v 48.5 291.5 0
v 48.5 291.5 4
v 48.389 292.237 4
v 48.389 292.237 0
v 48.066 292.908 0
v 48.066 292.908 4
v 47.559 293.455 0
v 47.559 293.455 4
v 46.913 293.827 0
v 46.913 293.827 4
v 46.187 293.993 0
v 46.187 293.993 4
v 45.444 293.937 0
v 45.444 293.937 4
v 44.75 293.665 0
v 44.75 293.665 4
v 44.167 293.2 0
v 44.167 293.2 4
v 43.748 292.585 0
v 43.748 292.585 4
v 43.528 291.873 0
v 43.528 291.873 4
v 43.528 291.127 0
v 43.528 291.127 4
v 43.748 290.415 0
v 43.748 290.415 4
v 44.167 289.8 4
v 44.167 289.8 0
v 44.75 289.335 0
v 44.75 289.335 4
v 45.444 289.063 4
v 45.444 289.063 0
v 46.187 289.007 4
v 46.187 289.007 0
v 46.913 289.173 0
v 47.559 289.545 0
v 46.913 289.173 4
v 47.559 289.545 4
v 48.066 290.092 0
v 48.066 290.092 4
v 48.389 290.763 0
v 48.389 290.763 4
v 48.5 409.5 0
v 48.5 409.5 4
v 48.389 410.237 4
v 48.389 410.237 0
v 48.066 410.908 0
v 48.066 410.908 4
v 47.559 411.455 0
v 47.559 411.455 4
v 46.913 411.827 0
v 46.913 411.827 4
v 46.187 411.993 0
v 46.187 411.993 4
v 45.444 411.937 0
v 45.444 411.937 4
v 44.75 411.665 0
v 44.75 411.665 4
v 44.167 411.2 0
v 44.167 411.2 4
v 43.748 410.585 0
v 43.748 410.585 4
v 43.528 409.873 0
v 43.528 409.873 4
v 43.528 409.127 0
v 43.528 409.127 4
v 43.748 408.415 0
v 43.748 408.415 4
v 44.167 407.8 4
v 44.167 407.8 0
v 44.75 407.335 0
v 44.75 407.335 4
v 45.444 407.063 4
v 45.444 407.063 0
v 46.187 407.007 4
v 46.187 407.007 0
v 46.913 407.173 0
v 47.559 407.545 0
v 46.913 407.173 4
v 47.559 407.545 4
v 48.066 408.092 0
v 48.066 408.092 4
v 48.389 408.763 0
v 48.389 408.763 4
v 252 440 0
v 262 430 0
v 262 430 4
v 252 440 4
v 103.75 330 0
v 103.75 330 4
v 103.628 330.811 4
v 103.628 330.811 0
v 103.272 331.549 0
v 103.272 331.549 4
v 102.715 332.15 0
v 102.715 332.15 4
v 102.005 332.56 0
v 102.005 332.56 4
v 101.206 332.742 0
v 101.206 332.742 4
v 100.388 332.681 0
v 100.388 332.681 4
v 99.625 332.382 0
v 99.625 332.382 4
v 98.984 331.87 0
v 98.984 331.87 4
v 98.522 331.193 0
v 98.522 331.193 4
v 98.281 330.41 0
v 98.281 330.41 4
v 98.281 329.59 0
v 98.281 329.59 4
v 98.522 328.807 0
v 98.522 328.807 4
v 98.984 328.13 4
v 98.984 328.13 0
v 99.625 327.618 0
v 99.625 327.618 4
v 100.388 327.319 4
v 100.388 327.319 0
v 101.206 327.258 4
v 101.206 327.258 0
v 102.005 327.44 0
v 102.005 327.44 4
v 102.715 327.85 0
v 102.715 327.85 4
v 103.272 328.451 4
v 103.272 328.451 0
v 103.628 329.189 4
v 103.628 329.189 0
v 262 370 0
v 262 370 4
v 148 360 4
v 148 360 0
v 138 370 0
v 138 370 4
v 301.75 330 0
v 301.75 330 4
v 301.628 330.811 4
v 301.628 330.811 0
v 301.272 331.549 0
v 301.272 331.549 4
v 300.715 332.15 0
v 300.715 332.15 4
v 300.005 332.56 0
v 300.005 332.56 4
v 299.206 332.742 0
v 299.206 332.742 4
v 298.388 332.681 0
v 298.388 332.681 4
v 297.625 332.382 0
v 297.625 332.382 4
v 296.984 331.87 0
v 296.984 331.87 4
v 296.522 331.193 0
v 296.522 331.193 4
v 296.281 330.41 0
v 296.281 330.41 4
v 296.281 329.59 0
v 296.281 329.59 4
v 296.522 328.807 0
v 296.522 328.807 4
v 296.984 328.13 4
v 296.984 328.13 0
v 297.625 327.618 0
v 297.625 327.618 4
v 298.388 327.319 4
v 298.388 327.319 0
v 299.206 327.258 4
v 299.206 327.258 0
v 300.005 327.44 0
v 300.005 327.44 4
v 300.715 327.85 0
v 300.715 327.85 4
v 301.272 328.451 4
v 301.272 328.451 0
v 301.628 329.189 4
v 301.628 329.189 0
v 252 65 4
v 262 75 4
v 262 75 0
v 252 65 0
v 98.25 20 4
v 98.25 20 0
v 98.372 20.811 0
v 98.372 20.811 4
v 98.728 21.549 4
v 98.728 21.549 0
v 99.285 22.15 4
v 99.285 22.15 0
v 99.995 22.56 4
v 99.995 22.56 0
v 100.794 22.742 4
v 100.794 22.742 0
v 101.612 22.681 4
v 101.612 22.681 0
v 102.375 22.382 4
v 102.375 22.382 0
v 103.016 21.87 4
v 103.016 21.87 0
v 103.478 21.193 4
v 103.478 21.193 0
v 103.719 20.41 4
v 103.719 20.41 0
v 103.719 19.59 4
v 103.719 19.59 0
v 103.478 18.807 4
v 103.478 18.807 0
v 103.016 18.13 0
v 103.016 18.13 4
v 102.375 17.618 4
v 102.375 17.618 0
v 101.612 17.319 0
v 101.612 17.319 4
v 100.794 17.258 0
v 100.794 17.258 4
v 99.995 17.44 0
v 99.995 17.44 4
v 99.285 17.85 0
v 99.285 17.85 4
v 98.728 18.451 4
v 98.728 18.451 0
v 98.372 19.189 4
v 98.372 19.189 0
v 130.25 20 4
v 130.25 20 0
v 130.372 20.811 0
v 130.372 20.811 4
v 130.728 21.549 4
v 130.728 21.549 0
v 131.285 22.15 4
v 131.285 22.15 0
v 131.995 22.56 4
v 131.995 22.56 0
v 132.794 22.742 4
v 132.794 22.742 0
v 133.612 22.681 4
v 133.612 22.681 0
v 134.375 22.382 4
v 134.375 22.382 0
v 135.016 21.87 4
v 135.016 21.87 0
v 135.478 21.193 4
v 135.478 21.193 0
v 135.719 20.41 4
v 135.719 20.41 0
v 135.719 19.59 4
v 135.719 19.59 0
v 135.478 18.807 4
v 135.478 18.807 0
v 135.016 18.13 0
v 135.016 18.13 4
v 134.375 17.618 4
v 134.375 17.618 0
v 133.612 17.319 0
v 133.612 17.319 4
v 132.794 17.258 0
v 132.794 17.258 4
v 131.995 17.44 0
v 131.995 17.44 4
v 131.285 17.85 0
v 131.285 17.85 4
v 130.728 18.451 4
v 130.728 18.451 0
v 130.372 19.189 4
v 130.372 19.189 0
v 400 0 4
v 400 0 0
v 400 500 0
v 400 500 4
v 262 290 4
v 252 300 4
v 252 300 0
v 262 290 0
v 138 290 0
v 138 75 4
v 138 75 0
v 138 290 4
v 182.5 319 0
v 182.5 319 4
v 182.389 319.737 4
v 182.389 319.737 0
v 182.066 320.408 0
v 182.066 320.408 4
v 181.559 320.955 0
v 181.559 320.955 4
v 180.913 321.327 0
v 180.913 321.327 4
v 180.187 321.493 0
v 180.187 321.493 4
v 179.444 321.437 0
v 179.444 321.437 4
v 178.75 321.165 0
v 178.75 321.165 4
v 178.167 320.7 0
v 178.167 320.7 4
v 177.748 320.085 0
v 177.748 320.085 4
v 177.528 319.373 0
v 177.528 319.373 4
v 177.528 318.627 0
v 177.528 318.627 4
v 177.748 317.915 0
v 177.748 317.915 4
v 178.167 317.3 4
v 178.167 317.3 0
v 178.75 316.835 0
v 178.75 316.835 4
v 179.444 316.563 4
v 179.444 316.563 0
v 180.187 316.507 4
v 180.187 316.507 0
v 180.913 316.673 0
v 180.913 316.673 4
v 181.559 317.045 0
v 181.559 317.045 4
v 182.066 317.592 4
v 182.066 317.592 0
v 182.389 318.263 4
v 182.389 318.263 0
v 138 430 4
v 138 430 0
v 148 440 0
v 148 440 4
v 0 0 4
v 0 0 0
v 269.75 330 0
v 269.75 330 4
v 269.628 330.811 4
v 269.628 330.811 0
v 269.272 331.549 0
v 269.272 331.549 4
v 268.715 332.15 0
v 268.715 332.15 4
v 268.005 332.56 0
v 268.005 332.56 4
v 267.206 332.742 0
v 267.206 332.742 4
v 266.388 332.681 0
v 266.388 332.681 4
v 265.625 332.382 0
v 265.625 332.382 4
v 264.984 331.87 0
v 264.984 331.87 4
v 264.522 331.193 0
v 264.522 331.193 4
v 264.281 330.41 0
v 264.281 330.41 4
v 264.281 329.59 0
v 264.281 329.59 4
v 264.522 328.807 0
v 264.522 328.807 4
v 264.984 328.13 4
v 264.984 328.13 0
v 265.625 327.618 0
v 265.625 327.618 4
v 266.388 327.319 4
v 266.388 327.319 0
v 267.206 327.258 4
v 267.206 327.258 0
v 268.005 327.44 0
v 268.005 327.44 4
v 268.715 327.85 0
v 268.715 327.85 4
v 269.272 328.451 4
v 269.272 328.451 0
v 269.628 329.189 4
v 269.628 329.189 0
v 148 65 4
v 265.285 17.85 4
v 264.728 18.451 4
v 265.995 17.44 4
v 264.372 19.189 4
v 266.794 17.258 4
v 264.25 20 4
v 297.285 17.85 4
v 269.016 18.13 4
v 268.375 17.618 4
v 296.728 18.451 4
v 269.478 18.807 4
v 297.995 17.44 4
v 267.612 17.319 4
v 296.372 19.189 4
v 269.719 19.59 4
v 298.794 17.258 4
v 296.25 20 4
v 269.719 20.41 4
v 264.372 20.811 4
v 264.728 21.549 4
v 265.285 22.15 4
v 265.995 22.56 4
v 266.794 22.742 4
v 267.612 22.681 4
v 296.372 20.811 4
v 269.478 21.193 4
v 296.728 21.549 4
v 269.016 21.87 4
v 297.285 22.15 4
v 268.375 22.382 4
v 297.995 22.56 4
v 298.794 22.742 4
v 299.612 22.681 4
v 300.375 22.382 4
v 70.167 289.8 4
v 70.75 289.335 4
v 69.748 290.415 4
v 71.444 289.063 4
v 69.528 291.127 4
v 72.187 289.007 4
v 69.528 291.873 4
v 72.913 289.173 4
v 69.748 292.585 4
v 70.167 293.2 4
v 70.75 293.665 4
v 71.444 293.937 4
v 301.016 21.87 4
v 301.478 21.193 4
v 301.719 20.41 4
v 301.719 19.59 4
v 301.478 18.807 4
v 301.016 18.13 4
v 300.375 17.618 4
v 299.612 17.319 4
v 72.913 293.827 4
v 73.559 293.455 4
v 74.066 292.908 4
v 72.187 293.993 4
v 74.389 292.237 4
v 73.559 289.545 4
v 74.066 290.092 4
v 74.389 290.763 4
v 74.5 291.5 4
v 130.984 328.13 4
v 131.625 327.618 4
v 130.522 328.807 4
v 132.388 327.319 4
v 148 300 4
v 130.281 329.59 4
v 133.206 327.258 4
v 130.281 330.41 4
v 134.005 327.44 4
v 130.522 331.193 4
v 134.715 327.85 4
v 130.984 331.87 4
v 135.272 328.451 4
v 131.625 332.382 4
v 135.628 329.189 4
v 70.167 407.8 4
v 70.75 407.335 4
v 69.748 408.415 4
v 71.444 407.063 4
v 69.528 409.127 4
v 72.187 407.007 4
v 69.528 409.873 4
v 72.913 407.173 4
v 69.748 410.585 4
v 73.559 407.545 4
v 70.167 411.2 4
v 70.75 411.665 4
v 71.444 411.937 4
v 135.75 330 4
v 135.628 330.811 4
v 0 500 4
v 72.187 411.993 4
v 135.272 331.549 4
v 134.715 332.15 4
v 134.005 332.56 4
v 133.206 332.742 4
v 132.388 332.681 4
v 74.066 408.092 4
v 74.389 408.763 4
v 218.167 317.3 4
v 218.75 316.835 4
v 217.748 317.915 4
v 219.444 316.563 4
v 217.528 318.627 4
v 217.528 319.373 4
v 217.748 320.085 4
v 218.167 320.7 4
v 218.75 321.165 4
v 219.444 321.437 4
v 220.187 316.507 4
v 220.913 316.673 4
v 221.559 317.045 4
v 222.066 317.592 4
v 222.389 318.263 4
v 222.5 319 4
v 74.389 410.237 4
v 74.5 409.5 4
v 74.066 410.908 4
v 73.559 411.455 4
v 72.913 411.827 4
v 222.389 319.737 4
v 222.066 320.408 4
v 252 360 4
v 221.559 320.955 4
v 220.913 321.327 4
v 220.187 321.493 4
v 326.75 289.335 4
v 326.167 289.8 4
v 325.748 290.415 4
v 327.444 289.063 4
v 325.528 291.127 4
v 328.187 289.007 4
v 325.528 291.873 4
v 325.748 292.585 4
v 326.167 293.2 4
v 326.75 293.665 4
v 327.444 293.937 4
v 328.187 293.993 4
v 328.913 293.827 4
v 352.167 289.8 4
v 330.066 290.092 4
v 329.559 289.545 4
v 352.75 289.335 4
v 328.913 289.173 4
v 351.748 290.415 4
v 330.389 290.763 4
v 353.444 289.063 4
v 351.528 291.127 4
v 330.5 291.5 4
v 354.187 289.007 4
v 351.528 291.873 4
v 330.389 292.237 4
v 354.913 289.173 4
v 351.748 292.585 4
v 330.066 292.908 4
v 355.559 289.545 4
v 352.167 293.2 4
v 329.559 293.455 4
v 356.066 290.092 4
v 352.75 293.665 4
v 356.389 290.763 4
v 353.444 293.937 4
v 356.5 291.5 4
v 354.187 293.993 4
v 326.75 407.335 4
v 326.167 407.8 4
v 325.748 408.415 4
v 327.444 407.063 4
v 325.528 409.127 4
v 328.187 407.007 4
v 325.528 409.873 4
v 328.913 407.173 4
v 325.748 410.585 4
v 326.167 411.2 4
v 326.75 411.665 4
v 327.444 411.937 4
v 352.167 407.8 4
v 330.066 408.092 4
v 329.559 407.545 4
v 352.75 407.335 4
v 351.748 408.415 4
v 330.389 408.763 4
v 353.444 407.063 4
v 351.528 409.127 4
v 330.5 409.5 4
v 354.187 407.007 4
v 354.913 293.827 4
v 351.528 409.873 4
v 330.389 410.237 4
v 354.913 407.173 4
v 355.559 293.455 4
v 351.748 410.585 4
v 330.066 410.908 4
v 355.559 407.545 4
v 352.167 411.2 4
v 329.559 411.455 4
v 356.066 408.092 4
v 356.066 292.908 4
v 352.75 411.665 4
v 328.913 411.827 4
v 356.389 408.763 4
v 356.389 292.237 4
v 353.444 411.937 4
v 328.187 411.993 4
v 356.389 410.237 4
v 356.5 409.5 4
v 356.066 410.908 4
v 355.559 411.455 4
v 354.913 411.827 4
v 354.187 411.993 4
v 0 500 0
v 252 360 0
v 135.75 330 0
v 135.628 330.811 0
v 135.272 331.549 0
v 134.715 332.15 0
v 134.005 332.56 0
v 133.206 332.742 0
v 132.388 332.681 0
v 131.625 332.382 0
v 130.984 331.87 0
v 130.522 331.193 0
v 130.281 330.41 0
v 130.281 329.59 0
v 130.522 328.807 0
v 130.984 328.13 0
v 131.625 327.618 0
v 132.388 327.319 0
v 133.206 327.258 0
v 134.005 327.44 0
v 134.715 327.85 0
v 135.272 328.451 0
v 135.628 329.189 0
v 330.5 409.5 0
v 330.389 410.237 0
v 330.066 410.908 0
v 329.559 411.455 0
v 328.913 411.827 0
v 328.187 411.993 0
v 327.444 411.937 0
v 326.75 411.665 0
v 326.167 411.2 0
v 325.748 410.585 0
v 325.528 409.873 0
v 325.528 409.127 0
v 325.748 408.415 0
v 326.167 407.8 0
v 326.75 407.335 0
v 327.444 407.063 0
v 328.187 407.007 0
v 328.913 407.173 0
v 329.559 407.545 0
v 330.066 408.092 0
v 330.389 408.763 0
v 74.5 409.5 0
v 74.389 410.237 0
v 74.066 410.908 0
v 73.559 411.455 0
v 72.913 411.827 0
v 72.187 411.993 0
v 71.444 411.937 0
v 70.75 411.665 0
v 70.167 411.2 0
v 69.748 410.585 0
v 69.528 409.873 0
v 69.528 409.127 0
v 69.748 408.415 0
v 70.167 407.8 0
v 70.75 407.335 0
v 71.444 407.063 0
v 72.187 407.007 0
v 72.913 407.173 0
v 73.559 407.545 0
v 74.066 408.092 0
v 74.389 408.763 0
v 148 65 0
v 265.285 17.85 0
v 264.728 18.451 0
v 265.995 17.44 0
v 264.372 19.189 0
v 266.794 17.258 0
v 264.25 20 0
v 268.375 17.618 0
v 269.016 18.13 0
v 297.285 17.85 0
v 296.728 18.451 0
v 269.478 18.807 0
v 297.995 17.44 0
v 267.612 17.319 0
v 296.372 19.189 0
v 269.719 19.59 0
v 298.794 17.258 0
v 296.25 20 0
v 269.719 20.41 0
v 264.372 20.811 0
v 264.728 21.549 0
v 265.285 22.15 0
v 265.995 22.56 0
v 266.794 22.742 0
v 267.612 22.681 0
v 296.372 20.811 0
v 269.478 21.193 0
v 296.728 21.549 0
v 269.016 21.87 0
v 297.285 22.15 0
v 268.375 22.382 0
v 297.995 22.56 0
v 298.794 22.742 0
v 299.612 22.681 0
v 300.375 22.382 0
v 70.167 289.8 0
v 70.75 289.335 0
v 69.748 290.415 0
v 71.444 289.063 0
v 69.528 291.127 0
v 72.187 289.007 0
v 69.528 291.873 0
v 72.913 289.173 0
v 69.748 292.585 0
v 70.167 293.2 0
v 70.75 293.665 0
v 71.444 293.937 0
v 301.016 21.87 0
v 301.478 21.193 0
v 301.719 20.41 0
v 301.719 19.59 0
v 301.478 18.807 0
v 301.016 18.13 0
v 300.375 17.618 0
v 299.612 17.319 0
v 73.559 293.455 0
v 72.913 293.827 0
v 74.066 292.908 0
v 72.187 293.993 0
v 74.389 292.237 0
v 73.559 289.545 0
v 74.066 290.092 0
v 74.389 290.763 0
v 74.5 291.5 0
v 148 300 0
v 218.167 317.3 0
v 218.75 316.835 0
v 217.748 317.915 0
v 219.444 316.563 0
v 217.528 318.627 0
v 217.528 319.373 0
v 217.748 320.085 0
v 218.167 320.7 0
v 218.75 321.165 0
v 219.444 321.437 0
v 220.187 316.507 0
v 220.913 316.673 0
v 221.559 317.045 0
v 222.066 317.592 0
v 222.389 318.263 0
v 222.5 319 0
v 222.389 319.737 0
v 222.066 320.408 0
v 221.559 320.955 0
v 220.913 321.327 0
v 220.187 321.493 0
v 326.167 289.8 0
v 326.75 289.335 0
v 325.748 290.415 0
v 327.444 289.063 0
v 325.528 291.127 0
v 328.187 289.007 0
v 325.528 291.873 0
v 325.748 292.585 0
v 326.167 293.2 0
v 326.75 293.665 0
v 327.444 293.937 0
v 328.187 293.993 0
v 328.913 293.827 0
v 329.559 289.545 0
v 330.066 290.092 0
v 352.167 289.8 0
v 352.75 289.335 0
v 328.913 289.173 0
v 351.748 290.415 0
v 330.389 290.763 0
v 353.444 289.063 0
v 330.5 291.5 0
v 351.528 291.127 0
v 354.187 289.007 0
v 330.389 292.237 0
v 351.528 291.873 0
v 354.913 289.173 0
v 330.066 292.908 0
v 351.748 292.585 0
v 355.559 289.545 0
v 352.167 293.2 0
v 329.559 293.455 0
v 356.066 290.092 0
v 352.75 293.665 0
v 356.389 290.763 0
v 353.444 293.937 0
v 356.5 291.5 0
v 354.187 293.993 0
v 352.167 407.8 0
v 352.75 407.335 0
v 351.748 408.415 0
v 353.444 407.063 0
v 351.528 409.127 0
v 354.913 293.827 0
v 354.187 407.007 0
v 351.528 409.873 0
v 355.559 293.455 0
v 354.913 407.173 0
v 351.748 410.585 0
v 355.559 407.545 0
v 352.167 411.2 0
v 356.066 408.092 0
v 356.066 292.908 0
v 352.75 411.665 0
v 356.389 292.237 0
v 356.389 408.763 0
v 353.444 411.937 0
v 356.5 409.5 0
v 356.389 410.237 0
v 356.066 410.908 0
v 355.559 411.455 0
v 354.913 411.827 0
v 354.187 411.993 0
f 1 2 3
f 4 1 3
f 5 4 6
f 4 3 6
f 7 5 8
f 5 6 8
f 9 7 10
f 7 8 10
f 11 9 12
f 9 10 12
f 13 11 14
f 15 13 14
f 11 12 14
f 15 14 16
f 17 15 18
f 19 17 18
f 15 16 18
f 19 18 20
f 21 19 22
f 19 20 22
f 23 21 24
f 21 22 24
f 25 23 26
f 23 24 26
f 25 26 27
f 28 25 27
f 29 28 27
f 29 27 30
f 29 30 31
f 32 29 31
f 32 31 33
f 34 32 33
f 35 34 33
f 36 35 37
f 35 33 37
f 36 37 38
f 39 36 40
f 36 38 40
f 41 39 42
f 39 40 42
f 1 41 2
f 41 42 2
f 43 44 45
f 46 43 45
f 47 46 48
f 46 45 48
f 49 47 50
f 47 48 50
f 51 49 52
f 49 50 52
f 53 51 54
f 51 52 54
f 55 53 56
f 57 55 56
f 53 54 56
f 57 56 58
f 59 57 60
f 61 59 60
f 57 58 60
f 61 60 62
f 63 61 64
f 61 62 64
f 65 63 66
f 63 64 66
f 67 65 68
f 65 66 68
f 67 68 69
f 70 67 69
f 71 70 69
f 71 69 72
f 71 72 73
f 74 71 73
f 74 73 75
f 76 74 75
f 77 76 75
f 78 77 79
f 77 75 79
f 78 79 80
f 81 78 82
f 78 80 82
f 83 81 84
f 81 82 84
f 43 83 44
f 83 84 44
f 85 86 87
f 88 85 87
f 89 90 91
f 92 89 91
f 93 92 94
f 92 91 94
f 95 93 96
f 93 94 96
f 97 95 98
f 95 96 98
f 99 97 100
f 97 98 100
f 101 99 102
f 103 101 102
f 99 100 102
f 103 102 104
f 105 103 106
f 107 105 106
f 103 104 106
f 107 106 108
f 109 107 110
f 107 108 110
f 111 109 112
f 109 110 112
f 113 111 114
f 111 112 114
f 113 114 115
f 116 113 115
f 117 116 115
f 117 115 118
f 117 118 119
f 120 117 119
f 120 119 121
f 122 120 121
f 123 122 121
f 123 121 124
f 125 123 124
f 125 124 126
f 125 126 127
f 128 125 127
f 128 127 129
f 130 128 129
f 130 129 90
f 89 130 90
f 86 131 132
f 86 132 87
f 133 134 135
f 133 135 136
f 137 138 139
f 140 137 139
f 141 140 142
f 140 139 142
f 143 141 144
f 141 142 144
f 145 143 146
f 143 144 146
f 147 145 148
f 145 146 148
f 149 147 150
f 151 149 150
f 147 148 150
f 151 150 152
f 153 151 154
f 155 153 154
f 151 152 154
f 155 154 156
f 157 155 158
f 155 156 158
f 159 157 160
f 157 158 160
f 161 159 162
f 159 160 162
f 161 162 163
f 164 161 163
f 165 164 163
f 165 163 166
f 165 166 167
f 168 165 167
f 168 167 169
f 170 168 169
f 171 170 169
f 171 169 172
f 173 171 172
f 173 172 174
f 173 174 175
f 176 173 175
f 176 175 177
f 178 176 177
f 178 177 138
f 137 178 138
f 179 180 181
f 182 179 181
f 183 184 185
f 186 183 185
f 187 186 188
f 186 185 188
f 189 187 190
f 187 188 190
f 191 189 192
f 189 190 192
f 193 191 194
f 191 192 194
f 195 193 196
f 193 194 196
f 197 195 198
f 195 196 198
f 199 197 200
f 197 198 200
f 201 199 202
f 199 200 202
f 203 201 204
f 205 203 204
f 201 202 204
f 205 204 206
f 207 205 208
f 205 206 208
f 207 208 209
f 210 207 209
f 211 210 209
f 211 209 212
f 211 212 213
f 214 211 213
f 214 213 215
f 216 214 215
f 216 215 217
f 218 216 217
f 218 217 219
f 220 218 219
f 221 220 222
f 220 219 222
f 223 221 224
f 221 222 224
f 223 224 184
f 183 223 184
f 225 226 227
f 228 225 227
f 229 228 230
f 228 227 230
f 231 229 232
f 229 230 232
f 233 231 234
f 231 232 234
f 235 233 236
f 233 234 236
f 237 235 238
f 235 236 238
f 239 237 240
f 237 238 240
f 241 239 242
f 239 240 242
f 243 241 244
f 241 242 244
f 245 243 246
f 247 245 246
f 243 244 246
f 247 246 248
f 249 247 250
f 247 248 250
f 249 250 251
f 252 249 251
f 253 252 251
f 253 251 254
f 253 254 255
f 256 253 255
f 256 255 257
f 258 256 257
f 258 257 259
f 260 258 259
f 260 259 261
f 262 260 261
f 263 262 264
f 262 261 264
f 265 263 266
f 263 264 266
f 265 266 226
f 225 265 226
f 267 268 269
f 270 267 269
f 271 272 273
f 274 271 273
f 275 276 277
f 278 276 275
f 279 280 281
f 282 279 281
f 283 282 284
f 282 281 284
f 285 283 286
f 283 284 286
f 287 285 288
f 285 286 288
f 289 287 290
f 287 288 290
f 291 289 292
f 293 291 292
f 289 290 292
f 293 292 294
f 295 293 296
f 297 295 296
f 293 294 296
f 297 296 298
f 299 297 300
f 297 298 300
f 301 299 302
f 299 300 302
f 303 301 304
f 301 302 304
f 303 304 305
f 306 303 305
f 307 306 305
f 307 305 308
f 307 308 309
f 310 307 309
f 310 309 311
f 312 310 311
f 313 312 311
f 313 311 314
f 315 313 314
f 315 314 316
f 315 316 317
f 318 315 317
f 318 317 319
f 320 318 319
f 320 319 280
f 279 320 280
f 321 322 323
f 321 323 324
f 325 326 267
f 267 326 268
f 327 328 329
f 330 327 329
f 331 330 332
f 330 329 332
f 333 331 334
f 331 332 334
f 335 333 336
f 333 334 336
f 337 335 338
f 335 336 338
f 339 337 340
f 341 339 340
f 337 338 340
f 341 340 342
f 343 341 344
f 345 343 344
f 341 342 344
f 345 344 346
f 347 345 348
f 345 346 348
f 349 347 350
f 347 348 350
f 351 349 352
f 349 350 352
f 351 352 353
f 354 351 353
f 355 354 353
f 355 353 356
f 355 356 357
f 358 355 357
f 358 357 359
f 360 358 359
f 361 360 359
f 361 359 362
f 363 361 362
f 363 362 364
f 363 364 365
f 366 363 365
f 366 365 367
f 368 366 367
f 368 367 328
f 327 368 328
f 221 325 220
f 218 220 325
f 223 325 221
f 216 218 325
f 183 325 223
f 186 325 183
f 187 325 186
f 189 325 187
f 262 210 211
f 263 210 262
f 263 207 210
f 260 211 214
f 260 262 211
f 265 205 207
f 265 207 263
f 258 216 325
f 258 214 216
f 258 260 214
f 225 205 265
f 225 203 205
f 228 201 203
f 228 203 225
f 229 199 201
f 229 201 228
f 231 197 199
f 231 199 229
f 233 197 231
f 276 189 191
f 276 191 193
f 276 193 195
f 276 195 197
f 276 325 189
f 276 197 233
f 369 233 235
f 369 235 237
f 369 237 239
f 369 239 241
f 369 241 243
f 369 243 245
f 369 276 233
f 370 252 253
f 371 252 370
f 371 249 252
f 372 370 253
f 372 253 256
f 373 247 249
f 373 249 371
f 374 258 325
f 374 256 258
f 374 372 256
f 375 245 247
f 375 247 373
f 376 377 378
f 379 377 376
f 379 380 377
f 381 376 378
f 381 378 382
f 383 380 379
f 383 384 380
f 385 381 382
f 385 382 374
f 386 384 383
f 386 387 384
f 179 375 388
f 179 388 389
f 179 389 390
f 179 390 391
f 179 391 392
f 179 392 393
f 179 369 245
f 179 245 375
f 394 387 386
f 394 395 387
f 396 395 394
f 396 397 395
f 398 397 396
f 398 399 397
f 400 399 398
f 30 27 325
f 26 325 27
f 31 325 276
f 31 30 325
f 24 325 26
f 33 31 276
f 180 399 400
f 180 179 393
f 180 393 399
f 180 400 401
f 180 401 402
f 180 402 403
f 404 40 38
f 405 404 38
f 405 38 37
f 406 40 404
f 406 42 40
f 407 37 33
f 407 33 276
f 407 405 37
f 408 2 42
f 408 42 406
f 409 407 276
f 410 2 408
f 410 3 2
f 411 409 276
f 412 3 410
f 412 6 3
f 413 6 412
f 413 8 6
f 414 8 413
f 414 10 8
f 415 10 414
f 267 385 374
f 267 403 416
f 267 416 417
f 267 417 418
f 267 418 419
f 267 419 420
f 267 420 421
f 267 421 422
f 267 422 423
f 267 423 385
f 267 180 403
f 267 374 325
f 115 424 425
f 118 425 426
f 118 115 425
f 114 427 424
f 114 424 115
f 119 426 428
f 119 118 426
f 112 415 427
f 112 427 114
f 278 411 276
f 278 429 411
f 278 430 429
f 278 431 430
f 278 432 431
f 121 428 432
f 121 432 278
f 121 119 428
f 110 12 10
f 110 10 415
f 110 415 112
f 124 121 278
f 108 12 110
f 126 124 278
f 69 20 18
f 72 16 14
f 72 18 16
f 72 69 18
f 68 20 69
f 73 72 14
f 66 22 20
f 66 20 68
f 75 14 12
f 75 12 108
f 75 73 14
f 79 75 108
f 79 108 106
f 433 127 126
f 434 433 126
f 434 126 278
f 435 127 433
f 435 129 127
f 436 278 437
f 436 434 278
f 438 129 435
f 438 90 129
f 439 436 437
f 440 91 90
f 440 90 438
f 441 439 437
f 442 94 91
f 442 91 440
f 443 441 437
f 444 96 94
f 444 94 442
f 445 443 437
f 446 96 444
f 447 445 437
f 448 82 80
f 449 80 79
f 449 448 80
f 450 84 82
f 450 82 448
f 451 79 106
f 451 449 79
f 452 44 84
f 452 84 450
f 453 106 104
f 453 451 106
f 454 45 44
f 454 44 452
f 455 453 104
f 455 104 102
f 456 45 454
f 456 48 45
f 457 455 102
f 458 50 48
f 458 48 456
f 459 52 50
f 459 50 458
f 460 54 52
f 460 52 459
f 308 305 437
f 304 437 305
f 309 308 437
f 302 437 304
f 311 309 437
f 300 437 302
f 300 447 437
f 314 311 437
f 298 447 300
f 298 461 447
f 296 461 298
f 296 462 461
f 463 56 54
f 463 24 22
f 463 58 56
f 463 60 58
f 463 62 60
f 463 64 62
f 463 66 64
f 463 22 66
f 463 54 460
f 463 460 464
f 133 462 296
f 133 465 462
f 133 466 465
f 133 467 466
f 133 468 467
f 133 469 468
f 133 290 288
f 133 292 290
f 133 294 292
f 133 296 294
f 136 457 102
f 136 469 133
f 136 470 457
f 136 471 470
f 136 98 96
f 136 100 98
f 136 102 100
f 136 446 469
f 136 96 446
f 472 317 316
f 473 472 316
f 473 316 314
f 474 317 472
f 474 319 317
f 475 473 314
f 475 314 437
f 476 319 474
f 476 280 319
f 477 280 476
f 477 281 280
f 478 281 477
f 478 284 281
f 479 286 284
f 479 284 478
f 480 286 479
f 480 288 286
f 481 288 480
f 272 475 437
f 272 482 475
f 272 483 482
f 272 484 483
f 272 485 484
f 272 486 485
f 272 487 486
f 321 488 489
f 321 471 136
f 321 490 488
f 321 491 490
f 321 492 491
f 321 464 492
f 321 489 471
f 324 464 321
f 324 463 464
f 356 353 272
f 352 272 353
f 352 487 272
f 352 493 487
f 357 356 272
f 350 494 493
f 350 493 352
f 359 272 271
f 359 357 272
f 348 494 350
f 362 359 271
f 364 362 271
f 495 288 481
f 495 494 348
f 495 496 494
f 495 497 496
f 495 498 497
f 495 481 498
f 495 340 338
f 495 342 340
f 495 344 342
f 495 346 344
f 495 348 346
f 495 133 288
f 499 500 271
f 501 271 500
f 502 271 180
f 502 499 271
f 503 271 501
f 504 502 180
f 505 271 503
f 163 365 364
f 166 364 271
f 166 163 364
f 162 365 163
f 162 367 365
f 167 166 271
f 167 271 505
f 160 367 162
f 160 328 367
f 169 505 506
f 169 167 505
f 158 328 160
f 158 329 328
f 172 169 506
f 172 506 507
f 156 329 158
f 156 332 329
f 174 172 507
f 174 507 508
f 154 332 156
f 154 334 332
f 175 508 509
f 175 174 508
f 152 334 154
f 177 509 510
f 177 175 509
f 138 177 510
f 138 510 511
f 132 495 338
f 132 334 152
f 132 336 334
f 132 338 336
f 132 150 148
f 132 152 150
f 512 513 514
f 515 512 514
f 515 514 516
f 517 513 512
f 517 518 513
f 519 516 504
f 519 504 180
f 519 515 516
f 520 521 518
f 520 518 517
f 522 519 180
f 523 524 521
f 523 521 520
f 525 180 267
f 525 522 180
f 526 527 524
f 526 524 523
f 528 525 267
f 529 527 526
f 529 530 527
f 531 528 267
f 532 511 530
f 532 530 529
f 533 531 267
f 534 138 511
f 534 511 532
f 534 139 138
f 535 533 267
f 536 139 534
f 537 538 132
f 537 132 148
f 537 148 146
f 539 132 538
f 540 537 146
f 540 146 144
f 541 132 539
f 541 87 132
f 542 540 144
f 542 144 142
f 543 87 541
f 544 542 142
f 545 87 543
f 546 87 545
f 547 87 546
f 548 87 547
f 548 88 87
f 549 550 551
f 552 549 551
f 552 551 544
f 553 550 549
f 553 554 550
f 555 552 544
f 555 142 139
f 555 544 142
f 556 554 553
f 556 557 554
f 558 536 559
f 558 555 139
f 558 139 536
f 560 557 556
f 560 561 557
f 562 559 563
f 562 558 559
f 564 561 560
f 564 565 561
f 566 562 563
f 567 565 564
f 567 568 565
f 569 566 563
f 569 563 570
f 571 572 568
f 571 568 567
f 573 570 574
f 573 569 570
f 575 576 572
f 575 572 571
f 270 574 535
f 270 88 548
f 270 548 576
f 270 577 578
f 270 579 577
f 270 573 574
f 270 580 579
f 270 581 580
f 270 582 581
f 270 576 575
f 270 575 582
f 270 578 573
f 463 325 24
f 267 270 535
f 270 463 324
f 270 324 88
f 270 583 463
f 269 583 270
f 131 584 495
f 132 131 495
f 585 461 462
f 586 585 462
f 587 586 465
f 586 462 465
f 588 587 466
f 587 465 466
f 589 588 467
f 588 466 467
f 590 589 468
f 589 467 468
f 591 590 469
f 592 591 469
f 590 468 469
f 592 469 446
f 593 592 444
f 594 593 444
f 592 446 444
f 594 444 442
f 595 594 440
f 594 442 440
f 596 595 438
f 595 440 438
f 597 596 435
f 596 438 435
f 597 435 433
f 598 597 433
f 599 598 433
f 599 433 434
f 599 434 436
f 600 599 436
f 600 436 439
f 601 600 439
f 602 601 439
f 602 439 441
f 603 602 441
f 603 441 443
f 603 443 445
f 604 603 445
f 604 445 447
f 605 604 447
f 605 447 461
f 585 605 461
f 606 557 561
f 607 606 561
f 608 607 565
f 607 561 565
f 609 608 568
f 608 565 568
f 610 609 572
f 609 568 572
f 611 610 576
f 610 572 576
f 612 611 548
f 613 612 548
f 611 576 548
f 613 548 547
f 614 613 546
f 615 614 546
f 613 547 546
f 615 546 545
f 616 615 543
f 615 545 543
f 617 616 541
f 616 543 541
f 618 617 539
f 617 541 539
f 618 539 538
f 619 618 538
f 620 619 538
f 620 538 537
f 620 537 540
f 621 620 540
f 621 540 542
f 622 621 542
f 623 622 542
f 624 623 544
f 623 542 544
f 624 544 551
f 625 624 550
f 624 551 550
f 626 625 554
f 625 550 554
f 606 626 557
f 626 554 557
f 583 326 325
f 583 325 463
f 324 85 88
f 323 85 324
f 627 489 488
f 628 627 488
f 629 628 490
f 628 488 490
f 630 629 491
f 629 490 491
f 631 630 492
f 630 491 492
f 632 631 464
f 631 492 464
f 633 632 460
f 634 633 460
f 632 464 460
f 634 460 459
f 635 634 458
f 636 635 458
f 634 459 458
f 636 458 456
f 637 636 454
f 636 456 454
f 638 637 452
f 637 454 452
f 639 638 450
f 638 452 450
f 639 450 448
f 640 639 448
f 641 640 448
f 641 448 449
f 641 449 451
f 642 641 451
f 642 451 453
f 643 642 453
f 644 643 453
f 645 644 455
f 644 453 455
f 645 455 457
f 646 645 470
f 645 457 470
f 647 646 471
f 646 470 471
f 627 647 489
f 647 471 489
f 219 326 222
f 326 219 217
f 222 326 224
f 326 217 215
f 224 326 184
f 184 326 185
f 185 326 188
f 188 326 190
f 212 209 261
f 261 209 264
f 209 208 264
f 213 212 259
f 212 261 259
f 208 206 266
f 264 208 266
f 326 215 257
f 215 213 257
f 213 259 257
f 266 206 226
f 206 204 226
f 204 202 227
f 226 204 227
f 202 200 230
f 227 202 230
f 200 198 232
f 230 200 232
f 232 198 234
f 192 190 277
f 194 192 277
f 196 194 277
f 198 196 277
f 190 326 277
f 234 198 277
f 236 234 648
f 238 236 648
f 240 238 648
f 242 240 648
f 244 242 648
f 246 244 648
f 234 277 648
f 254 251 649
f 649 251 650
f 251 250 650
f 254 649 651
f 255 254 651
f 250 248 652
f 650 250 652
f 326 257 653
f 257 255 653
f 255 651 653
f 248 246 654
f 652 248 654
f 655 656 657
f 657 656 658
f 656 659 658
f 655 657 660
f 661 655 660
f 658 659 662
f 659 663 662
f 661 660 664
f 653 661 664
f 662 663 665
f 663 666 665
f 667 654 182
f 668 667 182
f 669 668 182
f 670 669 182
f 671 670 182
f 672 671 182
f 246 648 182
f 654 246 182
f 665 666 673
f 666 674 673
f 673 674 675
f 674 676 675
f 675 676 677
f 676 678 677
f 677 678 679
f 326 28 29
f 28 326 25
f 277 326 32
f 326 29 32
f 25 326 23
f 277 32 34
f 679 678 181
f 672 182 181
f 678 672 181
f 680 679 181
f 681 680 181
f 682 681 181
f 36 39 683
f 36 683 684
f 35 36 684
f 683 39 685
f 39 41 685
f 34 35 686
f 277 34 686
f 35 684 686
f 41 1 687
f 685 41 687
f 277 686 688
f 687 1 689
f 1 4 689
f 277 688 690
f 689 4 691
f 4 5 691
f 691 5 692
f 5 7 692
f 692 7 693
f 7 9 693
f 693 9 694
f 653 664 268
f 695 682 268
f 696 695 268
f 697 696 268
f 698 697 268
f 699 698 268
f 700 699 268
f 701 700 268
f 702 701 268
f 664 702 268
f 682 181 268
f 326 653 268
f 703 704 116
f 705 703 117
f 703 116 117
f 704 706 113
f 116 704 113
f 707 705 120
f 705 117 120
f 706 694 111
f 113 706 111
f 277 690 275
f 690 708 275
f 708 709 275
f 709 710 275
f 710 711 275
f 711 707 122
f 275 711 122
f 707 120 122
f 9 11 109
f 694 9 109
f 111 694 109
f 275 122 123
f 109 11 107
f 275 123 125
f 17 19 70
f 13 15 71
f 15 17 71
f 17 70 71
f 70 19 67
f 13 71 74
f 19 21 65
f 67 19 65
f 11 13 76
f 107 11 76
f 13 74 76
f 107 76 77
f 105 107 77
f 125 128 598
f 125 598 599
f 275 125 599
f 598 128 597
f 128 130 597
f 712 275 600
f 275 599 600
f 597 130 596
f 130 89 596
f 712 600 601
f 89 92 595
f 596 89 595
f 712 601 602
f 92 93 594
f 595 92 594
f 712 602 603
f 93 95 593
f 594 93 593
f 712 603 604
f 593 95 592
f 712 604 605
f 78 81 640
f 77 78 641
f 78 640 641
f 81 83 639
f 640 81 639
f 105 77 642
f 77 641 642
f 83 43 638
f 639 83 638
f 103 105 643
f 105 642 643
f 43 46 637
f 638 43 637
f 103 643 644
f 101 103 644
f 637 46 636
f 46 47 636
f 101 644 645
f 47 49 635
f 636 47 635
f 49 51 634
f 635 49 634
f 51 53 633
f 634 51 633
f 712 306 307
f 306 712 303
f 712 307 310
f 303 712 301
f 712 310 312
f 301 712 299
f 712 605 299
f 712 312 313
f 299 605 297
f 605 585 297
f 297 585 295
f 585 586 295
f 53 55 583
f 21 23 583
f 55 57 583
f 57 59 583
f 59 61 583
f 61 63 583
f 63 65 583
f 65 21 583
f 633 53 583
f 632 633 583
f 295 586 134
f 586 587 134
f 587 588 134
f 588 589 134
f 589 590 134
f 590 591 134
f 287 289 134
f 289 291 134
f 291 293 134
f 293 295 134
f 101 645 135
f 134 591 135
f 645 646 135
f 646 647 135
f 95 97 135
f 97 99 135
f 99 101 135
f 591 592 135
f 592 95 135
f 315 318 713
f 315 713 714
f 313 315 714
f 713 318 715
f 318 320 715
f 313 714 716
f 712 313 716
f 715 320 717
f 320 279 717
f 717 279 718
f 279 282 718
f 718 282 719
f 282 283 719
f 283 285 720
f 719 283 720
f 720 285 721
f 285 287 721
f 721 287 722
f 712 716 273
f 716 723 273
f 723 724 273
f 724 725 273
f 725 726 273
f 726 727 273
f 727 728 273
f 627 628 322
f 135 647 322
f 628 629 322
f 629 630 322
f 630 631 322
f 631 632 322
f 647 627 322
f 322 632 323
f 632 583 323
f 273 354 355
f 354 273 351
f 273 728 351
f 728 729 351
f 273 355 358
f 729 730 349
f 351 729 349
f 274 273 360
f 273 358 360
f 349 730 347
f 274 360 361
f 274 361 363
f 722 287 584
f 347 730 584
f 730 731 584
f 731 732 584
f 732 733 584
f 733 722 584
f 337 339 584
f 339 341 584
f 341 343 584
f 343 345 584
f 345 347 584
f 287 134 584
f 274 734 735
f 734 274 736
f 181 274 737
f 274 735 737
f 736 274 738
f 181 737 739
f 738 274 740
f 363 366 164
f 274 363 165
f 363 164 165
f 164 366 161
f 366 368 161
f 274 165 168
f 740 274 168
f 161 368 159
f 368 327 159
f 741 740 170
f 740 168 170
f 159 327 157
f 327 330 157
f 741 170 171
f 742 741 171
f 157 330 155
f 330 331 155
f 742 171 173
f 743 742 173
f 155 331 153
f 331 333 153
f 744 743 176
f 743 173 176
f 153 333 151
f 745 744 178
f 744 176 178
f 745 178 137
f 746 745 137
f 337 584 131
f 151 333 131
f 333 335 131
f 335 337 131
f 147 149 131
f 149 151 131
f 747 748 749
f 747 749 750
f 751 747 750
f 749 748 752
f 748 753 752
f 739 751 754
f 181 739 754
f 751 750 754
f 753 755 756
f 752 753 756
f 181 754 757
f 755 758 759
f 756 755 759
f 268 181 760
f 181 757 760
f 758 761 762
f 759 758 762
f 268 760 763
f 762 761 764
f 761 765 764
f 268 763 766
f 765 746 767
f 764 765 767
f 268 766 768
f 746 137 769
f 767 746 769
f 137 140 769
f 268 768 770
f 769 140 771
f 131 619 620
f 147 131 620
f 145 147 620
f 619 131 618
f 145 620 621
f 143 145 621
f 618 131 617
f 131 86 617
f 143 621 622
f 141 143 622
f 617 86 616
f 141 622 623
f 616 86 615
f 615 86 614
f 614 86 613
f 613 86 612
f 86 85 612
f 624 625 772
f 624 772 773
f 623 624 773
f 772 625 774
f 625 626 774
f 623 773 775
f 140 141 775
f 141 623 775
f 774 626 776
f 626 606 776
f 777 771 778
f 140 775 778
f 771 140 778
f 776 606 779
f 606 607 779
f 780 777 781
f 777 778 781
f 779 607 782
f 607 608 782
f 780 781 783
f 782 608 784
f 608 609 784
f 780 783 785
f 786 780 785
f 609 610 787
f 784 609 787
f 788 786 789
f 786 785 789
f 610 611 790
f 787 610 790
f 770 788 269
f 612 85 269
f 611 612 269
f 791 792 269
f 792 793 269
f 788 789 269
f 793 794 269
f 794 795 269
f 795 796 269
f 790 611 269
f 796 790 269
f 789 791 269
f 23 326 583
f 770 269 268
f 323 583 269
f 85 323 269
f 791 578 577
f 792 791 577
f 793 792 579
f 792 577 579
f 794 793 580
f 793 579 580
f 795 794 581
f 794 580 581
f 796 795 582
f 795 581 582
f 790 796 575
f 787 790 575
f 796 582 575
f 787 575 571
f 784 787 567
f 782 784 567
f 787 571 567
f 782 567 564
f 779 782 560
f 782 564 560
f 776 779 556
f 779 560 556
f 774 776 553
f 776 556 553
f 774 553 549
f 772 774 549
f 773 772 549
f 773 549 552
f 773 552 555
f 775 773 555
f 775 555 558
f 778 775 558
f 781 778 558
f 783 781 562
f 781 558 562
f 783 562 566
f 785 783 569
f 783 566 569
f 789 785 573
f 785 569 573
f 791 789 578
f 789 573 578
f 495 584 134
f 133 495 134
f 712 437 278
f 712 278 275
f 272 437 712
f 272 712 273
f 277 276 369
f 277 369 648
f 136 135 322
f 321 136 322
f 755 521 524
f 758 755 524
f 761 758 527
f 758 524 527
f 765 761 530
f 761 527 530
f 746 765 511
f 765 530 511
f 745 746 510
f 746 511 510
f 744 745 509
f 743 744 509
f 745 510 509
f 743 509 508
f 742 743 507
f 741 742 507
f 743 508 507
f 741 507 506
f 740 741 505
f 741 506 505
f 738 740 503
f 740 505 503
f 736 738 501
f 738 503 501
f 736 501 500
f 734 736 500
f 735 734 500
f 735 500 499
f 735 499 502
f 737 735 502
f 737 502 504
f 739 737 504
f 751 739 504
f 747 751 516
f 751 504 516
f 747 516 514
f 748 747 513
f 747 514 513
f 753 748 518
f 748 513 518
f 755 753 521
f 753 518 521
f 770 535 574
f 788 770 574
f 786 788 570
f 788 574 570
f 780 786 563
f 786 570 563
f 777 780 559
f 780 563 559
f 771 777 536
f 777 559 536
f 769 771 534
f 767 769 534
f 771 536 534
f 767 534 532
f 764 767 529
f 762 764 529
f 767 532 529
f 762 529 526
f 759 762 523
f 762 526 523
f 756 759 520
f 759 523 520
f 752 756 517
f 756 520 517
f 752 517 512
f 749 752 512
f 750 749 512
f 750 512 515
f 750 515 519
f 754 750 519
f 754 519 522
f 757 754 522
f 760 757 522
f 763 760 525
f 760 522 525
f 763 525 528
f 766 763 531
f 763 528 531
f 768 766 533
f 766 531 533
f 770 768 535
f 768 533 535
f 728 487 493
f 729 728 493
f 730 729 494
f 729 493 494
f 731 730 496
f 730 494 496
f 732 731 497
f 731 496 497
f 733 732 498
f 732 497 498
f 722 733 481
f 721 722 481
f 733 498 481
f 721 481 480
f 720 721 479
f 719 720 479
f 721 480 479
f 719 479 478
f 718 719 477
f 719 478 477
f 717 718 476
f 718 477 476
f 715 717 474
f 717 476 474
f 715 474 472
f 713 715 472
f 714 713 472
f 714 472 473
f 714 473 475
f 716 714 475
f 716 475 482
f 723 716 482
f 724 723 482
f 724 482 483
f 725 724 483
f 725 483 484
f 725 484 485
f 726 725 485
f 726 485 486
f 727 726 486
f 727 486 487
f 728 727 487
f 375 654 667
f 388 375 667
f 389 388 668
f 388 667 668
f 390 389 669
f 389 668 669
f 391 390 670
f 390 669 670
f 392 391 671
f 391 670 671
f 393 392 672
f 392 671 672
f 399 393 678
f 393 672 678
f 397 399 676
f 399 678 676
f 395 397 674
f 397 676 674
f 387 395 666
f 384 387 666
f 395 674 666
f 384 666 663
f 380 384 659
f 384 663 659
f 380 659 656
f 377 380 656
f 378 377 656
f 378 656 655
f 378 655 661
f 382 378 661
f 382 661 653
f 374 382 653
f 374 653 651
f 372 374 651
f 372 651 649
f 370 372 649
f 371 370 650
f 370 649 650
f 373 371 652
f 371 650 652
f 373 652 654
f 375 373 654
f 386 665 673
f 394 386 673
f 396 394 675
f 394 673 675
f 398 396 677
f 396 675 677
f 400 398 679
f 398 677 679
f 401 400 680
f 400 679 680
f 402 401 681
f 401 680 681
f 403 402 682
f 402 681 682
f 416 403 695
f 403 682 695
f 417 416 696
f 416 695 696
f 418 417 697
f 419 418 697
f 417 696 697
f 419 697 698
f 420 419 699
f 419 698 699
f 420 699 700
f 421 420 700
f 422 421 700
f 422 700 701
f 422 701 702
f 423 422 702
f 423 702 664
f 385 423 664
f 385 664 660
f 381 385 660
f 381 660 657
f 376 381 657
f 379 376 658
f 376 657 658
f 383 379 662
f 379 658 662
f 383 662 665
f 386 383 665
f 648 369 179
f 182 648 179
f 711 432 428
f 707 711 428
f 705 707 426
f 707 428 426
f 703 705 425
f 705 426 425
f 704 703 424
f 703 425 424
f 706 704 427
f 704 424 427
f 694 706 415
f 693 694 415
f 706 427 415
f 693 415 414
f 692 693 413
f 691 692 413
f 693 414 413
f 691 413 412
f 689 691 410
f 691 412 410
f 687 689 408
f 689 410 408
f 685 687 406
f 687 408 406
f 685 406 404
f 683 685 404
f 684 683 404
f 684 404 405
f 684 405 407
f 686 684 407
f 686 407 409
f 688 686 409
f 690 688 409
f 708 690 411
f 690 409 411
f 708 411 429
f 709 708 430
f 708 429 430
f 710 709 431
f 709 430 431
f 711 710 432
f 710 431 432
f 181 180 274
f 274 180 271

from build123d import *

# Parameters (mm, degrees)
SKETCH1_W           = 400
SKETCH1_H           = 500
BOSS_EXTRUDE1_DEPTH = 4
SKETCH2_W           = 124
SKETCH2_H           = 235
CUT_EXTRUDE1_DEPTH  = 5
SKETCH4_R           = 2.75
CUT_EXTRUDE3_DEPTH  = 10
SKETCH5_R           = 2.5
CUT_EXTRUDE4_DEPTH  = 5
SKETCH6_R           = 2.5
CUT_EXTRUDE5_DEPTH  = 4
SKETCH7_R           = 2.75
CUT_EXTRUDE6_DEPTH  = 4
SKETCH9_W           = 124
SKETCH9_H           = 80
CUT_EXTRUDE9_DEPTH  = 4
CHAMFER1_SIZE       = 10


with BuildPart() as part:
    # Sketch1 → Boss-Extrude1 (new body)
    with BuildSketch(Plane.XY):
        with Locations((200, 250)):
            Rectangle(SKETCH1_W, SKETCH1_H)
    extrude(amount=BOSS_EXTRUDE1_DEPTH)

    # Sketch2 → Cut-Extrude1 (cut, through all)
    with BuildSketch(Plane.XY.offset(4)):
        with Locations((200, 182.5)):
            Rectangle(SKETCH2_W, SKETCH2_H)
    extrude(amount=-CUT_EXTRUDE1_DEPTH, mode=Mode.SUBTRACT)

    # Sketch4 → Cut-Extrude3 (cut)
    with BuildSketch(Plane.XY.offset(4)):
        with Locations((299, 330)):
            Circle(SKETCH4_R)
        with Locations((267, 330)):
            Circle(SKETCH4_R)
        with Locations((133, 330)):
            Circle(SKETCH4_R)
        with Locations((101, 330)):
            Circle(SKETCH4_R)
    extrude(amount=-CUT_EXTRUDE3_DEPTH, mode=Mode.SUBTRACT)

    # Sketch5 → Cut-Extrude4 (cut, through all)
    with BuildSketch(Plane.XY.offset(4)):
        with Locations((180, 319)):
            Circle(SKETCH5_R)
        with Locations((220, 319)):
            Circle(SKETCH5_R)
    extrude(amount=-CUT_EXTRUDE4_DEPTH, mode=Mode.SUBTRACT)

    # Sketch6 → Cut-Extrude5 (cut)
    with BuildSketch(Plane.XY.offset(4)):
        with Locations((72, 409.5)):
            Circle(SKETCH6_R)
        with Locations((46, 409.5)):
            Circle(SKETCH6_R)
        with Locations((72, 291.5)):
            Circle(SKETCH6_R)
        with Locations((46, 291.5)):
            Circle(SKETCH6_R)
        with Locations((328, 291.5)):
            Circle(SKETCH6_R)
        with Locations((354, 291.5)):
            Circle(SKETCH6_R)
        with Locations((328, 409.5)):
            Circle(SKETCH6_R)
        with Locations((354, 409.5)):
            Circle(SKETCH6_R)
    extrude(amount=-CUT_EXTRUDE5_DEPTH, mode=Mode.SUBTRACT)

    # Sketch7 → Cut-Extrude6 (cut)
    with BuildSketch(Plane(origin=(0, 0, 0), x_dir=(-1, 0, 0), z_dir=(0, 0, -1))):
        with Locations((-267, 20)):
            Circle(SKETCH7_R)
        with Locations((-299, 20)):
            Circle(SKETCH7_R)
        with Locations((-133, 20)):
            Circle(SKETCH7_R)
        with Locations((-101, 20)):
            Circle(SKETCH7_R)
    extrude(amount=-CUT_EXTRUDE6_DEPTH, mode=Mode.SUBTRACT)

    # Sketch9 → Cut-Extrude9 (cut)
    with BuildSketch(Plane(origin=(0, 0, 0), x_dir=(-1, 0, 0), z_dir=(0, 0, -1))):
        with Locations((-200, 400)):
            Rectangle(SKETCH9_W, SKETCH9_H)
    extrude(amount=-CUT_EXTRUDE9_DEPTH, mode=Mode.SUBTRACT)

    # Chamfer1
    chamfer1_edges = [part.edges().sort_by_distance(p)[0] for p in [
        (138, 440, 2),
        (138, 360, 2),
        (262, 360, 2),
        (262, 440, 2),
        (138, 300, 2),
        (262, 300, 2),
        (262, 65, 2),
        (138, 65, 2),
    ]]
    chamfer(chamfer1_edges, length=CHAMFER1_SIZE)


solid = part.part
